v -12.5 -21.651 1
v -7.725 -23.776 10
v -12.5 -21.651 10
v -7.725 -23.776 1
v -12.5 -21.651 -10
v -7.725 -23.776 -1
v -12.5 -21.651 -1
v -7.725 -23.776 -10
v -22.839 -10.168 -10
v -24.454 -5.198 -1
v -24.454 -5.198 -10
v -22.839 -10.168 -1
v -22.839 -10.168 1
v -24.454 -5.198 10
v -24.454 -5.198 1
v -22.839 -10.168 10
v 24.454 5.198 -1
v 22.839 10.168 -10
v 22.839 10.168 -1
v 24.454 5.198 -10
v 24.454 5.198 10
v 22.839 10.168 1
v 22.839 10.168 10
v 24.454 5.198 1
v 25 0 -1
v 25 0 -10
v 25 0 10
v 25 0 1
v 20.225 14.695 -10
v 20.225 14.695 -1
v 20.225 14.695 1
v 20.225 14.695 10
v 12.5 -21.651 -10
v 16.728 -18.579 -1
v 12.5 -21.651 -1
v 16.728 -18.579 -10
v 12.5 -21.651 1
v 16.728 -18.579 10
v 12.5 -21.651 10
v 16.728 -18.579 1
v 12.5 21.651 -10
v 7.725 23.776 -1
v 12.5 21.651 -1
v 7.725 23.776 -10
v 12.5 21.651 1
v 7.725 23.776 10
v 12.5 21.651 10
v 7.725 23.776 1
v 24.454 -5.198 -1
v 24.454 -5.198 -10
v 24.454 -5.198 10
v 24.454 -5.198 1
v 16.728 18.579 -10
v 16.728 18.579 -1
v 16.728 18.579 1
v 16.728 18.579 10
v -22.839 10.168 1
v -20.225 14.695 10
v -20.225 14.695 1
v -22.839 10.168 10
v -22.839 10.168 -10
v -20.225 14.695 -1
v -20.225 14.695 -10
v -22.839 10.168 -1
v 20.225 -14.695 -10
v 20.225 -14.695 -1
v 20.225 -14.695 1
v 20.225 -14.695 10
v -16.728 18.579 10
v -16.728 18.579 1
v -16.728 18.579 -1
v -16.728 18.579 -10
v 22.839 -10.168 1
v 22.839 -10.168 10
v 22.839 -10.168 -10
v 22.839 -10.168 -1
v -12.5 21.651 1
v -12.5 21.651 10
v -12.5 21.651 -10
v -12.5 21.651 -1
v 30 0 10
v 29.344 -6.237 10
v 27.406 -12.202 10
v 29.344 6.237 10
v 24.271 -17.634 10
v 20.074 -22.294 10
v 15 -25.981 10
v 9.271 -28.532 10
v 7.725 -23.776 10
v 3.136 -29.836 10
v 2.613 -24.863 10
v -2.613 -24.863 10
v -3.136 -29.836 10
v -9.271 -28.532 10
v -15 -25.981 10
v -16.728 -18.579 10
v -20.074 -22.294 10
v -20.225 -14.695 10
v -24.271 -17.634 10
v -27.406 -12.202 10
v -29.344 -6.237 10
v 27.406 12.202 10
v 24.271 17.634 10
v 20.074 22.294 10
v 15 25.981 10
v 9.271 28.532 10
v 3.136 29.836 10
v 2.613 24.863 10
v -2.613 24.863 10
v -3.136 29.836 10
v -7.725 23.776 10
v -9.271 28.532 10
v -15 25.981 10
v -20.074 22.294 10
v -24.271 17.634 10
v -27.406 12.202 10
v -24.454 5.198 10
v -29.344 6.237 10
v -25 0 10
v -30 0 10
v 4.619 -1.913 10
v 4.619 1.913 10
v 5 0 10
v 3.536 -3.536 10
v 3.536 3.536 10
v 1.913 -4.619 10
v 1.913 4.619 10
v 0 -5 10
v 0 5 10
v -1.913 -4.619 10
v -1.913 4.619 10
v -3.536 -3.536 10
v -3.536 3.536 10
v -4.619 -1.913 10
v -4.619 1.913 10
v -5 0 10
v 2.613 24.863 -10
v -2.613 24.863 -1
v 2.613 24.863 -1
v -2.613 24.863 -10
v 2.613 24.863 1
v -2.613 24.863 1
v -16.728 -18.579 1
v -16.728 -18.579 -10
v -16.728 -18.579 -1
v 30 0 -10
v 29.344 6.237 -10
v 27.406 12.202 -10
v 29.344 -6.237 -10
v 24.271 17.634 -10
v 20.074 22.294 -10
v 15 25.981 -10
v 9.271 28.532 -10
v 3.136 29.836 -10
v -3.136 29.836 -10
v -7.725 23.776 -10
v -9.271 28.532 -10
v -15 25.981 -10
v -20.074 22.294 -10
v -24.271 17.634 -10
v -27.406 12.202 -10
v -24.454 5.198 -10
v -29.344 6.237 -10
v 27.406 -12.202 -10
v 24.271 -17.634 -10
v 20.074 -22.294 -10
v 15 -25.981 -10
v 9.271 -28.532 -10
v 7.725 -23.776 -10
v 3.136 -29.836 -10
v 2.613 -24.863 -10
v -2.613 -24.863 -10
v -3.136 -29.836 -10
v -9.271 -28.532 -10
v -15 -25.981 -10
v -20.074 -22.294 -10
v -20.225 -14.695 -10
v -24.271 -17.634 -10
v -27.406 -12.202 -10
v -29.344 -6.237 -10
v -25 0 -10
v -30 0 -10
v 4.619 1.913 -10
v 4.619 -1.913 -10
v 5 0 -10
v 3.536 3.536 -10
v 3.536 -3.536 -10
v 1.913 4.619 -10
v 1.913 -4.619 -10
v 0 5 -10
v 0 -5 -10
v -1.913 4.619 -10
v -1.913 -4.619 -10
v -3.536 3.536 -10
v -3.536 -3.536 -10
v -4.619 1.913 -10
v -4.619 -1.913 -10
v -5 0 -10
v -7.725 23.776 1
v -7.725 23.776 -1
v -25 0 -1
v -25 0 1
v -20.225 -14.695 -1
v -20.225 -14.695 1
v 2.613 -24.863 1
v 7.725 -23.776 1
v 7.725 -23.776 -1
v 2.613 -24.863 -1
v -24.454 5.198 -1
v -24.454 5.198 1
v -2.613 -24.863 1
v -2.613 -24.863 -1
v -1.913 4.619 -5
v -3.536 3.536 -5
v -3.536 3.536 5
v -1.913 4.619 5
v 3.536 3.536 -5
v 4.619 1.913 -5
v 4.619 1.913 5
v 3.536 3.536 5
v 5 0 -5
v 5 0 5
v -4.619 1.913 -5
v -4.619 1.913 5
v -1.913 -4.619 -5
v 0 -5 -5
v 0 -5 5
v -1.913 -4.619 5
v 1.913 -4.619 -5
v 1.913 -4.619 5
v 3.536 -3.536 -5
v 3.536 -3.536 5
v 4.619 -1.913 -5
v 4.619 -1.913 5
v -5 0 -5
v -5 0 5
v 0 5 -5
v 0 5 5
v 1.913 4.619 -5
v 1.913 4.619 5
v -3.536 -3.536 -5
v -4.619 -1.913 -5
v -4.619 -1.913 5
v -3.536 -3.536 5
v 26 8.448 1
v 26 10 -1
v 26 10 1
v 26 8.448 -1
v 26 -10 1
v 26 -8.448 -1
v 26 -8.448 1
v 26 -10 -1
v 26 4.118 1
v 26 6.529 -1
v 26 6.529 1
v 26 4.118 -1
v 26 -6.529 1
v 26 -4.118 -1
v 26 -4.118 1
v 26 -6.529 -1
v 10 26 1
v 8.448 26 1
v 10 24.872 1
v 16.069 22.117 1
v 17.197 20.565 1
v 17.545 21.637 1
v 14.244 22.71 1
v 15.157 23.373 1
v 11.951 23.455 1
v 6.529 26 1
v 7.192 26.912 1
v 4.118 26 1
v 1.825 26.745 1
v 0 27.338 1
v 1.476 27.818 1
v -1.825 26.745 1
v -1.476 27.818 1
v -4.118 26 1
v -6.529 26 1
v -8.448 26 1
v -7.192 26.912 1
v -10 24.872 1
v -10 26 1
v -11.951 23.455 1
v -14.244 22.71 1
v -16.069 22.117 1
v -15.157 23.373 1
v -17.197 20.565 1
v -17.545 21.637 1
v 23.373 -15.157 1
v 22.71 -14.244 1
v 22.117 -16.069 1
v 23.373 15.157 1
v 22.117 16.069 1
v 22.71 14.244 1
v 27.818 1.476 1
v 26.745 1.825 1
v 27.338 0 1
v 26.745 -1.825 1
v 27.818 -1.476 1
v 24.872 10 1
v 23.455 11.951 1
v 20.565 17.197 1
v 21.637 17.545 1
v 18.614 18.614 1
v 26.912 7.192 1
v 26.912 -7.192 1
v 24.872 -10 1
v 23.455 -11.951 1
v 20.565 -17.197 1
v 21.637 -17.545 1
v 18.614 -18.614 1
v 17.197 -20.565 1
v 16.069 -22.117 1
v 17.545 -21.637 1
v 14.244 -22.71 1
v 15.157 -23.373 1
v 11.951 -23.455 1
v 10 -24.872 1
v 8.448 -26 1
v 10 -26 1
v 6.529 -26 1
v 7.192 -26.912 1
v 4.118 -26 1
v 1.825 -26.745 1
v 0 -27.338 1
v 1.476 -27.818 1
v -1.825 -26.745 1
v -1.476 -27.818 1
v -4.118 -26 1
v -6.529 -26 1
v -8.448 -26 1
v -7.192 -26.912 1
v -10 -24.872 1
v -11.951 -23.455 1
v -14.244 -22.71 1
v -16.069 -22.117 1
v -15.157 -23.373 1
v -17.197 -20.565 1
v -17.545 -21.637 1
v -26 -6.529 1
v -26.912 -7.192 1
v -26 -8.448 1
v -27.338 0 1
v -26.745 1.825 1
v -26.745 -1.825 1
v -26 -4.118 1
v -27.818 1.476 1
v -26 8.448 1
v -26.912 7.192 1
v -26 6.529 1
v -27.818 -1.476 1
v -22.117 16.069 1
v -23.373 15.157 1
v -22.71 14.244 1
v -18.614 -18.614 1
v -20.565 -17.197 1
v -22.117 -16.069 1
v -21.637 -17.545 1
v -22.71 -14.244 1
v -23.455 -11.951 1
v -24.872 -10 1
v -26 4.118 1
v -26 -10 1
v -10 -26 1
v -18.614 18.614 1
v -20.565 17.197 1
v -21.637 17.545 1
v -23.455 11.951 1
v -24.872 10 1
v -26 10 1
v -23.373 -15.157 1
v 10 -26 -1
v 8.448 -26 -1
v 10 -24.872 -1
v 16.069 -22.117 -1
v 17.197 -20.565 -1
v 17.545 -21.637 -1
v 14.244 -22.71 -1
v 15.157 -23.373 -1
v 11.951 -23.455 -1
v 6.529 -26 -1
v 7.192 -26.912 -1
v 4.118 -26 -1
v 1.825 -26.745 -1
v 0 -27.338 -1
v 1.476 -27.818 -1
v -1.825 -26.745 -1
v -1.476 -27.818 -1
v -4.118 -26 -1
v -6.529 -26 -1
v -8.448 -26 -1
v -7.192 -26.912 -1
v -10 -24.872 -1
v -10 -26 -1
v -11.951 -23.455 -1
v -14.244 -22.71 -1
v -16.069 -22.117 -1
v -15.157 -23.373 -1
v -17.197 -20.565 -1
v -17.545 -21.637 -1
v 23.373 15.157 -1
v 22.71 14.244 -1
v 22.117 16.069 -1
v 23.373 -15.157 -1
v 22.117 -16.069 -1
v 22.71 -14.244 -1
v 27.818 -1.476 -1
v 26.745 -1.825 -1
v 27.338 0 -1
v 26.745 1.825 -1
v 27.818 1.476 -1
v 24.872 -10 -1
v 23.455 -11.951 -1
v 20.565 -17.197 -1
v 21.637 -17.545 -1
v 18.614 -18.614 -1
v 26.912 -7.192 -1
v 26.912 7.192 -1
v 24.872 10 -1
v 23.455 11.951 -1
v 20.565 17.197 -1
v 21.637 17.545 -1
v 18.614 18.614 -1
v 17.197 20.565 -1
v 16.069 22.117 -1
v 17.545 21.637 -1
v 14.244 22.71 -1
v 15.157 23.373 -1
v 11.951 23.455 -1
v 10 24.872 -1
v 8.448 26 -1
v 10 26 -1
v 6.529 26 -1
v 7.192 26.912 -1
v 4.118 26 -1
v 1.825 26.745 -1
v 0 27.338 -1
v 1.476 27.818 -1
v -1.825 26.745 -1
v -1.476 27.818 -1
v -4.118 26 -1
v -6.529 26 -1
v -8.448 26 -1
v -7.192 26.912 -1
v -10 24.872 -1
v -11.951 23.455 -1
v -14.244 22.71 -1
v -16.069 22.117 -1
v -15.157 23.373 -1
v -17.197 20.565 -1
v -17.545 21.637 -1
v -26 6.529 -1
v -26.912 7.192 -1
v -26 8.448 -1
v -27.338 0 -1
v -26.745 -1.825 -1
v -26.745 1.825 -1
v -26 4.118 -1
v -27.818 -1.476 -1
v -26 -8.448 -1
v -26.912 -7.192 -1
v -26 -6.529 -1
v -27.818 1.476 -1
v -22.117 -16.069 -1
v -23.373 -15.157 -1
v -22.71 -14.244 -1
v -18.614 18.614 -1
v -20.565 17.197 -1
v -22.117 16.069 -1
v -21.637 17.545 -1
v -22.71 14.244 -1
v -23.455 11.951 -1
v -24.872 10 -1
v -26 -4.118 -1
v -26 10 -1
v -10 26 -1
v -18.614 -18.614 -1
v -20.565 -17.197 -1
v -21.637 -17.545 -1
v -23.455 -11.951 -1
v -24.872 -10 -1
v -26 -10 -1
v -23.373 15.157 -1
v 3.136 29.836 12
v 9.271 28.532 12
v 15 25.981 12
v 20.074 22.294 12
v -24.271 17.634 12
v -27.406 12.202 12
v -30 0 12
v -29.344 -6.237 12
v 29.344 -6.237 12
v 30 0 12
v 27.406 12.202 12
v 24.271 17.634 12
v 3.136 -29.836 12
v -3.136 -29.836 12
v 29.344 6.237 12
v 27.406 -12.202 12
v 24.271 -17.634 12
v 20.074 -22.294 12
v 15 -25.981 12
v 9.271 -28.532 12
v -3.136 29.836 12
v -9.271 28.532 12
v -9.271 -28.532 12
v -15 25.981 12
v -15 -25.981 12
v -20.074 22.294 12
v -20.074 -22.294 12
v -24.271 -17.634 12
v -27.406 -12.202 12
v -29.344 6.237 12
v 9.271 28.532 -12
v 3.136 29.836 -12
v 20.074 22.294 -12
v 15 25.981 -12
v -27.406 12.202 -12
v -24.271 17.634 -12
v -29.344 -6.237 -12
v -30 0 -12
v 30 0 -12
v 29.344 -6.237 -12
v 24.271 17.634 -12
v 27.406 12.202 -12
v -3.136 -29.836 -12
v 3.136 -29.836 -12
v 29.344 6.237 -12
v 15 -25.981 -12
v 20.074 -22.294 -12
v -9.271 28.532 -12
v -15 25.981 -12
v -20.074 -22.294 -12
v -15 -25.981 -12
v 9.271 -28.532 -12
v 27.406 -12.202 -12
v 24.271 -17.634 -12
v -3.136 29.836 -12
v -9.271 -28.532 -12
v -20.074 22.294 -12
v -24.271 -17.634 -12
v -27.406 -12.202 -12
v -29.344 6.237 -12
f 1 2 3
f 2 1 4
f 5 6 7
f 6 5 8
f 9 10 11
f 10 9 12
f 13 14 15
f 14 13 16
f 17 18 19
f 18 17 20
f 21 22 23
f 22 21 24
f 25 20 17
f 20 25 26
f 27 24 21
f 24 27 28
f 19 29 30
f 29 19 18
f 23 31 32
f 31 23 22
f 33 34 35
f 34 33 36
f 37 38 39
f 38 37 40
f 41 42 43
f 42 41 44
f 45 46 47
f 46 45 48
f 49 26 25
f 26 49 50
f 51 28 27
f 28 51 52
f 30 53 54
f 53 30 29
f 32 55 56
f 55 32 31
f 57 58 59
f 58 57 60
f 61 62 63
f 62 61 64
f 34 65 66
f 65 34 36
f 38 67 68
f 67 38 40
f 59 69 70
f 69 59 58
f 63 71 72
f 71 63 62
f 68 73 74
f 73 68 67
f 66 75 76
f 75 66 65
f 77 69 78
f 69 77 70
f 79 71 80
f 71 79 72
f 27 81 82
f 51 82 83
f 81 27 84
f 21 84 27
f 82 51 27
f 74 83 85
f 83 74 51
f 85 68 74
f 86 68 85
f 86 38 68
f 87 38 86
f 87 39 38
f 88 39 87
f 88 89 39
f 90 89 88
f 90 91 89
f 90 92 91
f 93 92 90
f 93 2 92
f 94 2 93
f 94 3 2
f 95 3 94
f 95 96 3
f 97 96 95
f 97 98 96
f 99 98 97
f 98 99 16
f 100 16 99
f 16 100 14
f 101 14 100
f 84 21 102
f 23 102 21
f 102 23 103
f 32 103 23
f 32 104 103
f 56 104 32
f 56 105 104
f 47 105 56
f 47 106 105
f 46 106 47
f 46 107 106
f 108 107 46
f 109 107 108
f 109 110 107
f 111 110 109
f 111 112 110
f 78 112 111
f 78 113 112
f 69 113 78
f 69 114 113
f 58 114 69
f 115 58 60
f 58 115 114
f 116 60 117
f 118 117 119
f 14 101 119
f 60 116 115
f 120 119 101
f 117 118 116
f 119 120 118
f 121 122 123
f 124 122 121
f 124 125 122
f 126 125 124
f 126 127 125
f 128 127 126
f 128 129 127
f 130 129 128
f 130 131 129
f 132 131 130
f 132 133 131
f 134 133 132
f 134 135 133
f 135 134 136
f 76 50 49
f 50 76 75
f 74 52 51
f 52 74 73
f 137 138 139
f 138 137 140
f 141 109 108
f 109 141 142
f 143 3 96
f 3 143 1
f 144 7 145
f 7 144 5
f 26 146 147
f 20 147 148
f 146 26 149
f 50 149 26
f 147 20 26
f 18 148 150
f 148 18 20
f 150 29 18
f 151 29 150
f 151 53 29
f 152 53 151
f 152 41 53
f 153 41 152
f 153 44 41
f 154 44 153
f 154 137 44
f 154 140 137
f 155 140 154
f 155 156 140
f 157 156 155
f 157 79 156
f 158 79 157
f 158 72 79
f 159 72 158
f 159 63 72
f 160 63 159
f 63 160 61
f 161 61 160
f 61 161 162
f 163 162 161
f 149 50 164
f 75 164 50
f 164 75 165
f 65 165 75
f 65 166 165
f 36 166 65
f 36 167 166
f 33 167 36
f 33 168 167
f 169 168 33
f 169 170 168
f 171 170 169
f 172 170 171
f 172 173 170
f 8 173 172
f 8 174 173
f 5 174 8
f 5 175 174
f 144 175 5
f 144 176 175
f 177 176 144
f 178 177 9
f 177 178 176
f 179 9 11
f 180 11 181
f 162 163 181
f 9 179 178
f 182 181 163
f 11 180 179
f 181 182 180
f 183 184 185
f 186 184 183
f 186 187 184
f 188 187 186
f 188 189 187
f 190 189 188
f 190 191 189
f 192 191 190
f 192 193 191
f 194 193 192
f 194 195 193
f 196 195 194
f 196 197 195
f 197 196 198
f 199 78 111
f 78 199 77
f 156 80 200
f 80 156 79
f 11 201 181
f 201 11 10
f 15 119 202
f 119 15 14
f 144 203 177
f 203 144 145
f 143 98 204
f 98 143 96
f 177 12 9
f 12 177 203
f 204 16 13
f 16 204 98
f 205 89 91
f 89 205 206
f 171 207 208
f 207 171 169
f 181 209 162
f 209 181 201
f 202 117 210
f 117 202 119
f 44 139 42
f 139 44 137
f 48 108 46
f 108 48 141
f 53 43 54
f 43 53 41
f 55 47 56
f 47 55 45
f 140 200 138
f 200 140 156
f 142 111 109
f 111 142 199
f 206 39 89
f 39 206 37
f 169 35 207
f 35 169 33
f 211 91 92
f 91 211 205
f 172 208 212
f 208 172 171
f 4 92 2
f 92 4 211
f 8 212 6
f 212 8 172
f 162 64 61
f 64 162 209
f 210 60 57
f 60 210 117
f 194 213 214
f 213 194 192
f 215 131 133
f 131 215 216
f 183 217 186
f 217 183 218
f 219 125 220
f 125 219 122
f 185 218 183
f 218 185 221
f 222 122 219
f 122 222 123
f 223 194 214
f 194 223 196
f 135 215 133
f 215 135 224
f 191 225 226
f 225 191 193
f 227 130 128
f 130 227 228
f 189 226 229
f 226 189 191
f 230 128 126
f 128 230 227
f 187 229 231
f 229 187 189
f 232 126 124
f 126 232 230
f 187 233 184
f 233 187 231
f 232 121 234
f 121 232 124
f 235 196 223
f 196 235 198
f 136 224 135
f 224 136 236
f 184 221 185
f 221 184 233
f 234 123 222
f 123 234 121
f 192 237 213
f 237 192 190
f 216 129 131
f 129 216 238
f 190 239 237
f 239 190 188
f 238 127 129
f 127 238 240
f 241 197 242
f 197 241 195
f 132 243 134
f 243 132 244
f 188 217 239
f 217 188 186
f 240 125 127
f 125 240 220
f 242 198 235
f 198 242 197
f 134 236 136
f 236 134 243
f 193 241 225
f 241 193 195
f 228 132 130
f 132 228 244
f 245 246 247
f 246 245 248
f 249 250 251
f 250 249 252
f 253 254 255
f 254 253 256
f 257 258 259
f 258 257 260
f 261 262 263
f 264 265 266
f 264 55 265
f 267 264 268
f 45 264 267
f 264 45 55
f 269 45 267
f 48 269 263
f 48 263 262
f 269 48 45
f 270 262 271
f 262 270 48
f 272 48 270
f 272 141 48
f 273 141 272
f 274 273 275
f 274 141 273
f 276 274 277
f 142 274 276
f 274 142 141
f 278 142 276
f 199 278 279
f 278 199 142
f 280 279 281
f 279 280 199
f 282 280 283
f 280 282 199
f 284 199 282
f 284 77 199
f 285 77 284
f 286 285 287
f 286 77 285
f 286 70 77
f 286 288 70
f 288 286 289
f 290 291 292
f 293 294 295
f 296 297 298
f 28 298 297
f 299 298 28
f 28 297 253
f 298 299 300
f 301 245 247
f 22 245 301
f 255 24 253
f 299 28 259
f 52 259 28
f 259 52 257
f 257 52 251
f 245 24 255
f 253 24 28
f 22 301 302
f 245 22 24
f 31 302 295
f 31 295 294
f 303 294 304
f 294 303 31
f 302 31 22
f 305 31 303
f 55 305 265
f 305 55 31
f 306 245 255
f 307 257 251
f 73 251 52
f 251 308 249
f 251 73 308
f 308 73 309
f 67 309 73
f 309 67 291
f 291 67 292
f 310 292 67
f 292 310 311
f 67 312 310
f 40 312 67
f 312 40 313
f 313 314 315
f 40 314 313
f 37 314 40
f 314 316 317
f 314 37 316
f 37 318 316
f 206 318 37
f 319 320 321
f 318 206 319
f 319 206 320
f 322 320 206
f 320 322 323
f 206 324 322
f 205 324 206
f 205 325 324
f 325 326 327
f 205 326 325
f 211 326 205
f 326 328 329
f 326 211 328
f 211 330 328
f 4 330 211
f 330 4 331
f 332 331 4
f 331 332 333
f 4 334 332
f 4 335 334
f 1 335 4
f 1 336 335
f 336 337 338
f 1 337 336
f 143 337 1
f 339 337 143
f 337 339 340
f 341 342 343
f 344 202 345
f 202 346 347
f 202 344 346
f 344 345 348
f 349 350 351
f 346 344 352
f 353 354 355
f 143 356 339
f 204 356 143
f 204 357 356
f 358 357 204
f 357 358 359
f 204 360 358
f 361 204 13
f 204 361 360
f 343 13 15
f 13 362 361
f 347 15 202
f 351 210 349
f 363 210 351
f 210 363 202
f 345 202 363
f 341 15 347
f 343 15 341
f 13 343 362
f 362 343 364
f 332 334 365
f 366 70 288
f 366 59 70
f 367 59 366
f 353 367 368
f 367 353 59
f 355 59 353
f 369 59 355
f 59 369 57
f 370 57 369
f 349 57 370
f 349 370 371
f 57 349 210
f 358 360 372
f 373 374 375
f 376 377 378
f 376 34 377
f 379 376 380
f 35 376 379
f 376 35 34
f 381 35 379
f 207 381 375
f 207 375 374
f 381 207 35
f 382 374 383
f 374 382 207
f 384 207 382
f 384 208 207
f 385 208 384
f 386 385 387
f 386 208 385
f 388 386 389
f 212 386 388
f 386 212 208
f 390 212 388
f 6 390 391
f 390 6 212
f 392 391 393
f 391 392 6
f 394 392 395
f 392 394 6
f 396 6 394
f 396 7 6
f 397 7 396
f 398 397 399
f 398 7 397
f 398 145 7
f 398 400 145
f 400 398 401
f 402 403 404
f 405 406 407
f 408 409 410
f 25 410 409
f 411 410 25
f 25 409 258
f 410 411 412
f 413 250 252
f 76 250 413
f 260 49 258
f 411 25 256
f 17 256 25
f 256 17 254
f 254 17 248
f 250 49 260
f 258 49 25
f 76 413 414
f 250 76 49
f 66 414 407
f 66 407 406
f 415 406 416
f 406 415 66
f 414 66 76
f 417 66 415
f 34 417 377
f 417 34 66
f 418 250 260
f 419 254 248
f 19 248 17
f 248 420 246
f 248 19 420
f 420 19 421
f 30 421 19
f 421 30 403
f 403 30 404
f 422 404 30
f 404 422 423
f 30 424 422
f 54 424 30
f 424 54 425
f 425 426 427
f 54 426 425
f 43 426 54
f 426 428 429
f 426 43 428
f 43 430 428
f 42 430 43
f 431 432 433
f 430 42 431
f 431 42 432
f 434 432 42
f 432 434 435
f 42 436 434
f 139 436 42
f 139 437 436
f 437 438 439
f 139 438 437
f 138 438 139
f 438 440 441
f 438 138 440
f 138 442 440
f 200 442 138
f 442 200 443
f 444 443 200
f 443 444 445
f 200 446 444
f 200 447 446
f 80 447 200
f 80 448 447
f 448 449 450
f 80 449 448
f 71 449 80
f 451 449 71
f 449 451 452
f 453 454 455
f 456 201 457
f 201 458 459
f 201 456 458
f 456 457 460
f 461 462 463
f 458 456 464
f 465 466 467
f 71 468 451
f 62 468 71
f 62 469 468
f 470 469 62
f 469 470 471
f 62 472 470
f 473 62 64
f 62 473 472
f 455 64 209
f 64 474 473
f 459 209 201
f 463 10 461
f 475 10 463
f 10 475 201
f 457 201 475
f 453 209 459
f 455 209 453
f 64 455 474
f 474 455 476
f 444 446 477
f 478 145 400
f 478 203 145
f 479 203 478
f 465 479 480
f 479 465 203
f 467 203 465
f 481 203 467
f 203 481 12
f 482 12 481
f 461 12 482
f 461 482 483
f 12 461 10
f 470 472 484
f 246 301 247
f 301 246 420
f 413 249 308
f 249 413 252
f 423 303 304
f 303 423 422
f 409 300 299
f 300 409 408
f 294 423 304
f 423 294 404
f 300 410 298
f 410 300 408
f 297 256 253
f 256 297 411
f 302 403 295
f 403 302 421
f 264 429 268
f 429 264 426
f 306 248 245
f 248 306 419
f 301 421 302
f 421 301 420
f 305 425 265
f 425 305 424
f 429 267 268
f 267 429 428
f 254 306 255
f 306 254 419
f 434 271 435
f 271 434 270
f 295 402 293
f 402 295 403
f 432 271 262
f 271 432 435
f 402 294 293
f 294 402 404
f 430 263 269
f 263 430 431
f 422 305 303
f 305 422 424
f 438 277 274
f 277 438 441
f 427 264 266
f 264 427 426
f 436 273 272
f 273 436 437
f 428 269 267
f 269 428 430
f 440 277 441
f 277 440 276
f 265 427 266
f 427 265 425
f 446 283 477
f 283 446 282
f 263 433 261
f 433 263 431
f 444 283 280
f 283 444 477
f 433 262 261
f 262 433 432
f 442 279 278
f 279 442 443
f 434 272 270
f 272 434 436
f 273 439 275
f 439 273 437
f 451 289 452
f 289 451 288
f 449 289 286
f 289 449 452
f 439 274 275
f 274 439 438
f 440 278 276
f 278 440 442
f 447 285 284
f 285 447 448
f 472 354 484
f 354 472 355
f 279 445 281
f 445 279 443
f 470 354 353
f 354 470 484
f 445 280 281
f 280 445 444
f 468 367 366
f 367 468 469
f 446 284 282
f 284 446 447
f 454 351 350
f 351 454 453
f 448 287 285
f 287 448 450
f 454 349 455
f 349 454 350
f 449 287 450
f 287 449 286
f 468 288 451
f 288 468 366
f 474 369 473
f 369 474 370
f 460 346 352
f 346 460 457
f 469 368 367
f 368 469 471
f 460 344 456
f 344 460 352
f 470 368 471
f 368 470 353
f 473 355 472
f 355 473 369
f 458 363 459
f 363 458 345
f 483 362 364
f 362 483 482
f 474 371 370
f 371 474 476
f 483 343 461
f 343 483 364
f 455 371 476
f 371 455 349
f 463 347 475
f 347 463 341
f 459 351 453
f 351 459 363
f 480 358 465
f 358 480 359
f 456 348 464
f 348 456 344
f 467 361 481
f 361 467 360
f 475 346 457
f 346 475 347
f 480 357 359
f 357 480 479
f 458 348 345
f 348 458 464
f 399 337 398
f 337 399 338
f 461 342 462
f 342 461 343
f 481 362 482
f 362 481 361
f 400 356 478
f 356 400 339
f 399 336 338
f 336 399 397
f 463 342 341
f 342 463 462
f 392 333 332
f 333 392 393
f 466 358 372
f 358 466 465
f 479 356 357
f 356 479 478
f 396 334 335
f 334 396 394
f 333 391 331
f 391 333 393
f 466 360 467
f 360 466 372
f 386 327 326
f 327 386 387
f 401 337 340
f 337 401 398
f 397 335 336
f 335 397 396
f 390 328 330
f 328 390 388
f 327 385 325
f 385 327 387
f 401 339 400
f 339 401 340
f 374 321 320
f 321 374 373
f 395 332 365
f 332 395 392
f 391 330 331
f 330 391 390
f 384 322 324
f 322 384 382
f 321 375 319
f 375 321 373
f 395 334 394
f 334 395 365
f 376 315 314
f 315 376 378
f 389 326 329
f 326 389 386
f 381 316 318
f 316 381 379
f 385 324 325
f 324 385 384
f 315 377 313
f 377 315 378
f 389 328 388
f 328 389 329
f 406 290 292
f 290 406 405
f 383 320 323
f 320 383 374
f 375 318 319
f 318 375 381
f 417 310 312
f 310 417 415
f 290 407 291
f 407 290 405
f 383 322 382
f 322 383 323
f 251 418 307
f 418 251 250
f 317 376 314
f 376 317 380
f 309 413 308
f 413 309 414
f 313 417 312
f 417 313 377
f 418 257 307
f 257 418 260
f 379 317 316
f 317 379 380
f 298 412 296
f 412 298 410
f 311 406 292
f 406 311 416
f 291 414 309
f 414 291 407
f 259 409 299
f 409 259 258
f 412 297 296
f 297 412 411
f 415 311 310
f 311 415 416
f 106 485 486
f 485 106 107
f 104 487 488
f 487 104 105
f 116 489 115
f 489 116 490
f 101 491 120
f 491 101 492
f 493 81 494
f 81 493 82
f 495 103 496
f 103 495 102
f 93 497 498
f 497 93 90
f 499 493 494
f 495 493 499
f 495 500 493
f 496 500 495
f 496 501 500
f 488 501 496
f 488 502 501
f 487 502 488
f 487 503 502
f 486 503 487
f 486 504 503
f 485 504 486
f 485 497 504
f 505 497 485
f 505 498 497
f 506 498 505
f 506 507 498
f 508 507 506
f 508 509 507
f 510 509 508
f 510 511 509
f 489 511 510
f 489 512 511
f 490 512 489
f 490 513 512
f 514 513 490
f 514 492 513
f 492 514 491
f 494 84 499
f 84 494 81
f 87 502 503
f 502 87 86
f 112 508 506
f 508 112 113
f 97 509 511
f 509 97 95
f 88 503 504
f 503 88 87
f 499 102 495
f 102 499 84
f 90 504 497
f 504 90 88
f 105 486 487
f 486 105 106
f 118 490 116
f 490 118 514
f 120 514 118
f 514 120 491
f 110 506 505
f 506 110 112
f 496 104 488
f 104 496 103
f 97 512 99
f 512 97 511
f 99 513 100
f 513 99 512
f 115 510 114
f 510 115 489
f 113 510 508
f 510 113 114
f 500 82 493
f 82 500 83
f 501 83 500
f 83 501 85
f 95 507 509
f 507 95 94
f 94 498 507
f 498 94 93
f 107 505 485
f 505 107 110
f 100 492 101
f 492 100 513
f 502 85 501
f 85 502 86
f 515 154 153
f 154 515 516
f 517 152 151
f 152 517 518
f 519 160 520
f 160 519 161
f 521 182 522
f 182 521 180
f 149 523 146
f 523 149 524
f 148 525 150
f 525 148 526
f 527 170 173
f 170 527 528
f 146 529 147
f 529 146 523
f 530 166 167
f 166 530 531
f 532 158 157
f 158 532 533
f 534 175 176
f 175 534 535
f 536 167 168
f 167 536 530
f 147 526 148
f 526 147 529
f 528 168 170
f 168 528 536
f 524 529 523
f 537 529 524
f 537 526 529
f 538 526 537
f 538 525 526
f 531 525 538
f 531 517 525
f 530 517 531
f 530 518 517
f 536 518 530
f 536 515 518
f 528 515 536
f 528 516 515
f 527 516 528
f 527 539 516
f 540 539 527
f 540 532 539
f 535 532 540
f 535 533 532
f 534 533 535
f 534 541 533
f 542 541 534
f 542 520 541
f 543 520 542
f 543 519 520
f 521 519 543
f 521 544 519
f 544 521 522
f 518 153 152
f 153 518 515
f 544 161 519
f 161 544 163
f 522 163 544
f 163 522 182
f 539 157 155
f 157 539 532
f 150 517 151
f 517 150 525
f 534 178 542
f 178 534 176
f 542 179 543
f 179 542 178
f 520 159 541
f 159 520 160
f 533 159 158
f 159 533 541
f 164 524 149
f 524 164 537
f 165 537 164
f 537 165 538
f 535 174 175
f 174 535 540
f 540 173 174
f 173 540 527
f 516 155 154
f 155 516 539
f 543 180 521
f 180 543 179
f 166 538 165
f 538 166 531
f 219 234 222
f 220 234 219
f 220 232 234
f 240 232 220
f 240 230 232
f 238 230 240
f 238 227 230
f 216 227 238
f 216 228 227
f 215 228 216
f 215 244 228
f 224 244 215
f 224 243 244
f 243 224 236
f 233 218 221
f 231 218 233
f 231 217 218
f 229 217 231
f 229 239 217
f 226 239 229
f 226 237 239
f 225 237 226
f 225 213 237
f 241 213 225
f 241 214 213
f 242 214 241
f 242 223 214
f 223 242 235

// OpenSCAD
// Parameters
pulley_diameter = 50;
pulley_width = 20;
bore_diameter = 10;
rim_tooth_height = 2;
rim_tooth_count = 20;
hub_diameter = 15;
hub_length = 10;
flange_thickness = 2;
set_screw_diameter = 3;
set_screw_distance = 5;

// Pulley Wheel
module pulley_wheel() {
    difference() {
        cylinder(d=pulley_diameter, h=pulley_width, center=true);
        translate([0, 0, -pulley_width/2])
            cylinder(d=bore_diameter, h=pulley_width + 2, center=false);
    }
}

// Rim Profile
module rim_profile() {
    for (i = [0:rim_tooth_count-1]) {
        rotate([0, 0, i * 360 / rim_tooth_count])
            translate([pulley_diameter/2, 0, 0])
                cube([rim_tooth_height, pulley_width, rim_tooth_height], center=true);
    }
}

// Hub
module hub() {
    translate([0, 0, -hub_length/2])
        cylinder(d=hub_diameter, h=hub_length, center=false);
}

// Flanges
module flanges() {
    translate([0, 0, pulley_width/2])
        cylinder(d=pulley_diameter + 10, h=flange_thickness, center=false);
    translate([0, 0, -pulley_width/2 - flange_thickness])
        cylinder(d=pulley_diameter + 10, h=flange_thickness, center=false);
}

// Set Screw Holes
module set_screw_holes() {
    for (i = [0:3]) {
        rotate([0, 0, i * 90])
            translate([hub_diameter/2 + set_screw_distance, 0, 0])
                rotate([90, 0, 0])
                    cylinder(d=set_screw_diameter, h=hub_length + 2, center=true);
    }
}

// Pulley Assembly
module pulley() {
    union() {
        pulley_wheel();
        rim_profile();
        hub();
        flanges();
        set_screw_holes();
    }
}

// Render the pulley
pulley();
